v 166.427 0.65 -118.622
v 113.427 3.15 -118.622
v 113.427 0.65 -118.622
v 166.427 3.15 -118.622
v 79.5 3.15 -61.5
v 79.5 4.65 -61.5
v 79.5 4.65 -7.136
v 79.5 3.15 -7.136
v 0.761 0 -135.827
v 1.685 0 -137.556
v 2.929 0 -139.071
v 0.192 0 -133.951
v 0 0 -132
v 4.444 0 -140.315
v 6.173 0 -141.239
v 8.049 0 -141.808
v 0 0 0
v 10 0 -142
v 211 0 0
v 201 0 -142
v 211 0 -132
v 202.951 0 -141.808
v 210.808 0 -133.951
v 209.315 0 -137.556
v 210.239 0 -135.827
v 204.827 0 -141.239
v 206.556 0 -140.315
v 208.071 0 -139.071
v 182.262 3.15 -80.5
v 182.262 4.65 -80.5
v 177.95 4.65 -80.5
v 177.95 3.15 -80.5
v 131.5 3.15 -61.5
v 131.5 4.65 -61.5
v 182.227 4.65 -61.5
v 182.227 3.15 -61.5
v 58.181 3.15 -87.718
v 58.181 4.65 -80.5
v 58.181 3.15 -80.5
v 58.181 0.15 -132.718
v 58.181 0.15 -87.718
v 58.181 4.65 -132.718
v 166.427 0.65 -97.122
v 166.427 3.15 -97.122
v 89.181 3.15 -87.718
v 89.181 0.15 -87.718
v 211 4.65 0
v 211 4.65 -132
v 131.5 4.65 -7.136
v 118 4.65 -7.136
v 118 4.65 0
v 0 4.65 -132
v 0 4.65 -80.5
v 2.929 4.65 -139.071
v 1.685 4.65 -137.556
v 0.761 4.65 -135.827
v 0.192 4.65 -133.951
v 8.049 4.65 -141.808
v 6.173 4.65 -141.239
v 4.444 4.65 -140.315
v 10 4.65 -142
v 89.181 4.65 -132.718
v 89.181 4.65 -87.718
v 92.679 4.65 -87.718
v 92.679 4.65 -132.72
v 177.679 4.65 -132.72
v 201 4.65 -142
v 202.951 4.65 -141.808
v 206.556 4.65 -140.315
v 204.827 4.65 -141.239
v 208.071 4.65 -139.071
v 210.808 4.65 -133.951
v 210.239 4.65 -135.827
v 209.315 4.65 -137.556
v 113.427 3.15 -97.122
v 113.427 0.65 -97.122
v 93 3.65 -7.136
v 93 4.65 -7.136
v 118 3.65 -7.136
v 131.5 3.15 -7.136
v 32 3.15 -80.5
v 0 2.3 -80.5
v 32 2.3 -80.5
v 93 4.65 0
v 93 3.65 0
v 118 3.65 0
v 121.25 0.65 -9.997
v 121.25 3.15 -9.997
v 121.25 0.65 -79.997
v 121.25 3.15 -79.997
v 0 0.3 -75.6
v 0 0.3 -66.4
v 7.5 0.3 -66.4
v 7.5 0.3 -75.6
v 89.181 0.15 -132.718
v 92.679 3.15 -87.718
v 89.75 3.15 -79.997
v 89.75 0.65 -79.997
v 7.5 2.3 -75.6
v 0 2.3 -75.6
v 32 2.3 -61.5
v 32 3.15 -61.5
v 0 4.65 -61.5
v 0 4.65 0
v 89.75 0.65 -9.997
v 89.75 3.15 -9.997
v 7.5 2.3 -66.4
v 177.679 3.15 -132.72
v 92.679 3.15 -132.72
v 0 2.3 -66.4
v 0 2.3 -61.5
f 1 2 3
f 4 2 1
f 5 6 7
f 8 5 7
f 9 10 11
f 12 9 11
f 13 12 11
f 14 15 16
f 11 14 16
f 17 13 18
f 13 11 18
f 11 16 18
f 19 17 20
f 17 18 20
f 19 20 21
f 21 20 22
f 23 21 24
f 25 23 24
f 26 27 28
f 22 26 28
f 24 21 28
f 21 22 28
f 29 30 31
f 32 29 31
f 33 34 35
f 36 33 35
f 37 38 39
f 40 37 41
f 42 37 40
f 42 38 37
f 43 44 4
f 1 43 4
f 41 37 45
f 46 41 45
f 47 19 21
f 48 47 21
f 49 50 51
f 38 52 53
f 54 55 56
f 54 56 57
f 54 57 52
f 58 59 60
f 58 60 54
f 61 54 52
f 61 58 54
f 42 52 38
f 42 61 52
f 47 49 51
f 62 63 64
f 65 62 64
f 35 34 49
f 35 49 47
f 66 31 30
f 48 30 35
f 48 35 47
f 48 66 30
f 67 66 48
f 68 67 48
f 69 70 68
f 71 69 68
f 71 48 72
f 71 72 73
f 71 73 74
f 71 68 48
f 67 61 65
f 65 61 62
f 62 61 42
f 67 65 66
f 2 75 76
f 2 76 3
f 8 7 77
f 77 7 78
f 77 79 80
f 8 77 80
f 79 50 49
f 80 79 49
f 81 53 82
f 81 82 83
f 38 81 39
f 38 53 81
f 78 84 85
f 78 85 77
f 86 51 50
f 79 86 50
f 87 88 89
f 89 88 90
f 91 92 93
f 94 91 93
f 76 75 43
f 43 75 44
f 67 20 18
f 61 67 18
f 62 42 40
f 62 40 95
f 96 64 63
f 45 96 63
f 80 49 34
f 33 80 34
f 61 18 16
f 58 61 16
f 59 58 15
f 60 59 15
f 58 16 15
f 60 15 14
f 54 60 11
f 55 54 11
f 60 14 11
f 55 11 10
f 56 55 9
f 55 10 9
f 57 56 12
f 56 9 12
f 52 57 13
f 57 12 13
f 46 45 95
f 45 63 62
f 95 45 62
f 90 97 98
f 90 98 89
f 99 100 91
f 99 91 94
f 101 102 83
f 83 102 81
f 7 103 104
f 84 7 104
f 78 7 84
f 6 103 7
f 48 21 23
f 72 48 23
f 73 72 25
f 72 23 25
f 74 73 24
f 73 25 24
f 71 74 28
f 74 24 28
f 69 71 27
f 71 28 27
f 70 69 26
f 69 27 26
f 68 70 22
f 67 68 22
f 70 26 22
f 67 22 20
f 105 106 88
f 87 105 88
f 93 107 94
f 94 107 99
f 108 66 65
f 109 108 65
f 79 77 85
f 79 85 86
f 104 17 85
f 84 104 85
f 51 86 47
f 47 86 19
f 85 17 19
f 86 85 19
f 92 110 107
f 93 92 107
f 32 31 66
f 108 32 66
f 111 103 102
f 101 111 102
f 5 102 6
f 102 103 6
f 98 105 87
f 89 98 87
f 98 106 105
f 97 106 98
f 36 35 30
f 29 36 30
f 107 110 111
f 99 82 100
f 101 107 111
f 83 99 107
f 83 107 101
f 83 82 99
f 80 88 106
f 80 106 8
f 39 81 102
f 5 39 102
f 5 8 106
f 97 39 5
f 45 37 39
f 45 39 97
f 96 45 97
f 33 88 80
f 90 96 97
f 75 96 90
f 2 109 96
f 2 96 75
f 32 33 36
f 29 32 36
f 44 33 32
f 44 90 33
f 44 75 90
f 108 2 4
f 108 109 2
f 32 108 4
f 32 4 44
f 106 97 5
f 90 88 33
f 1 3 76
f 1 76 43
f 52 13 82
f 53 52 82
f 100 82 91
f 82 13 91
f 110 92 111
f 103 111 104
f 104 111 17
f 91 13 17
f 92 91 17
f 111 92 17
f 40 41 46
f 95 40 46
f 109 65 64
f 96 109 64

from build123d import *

# Parameters (mm, degrees)
BOSS_EXTRUDE1_DEPTH = 4.65
SKETCH2_W           = 32
SKETCH2_H           = 19
CUT_EXTRUDE1_DEPTH  = 2.35
SKETCH3_W           = 7.5
SKETCH3_H           = 9.2
CUT_EXTRUDE2_DEPTH  = 2
SKETCH4_W           = 31
SKETCH4_H           = 45
CUT_EXTRUDE3_DEPTH  = 4.5
SKETCH5_W           = 53
SKETCH5_H           = 21.5
CUT_EXTRUDE4_DEPTH  = 4
CUT_EXTRUDE5_DEPTH  = 1.5
SKETCH7_W           = 25
SKETCH7_H           = 13.967841501
CUT_EXTRUDE6_DEPTH  = 1
SKETCH9_W           = 31.5
SKETCH9_H           = 70
CUT_EXTRUDE8_DEPTH  = 4


with BuildPart() as part:
    # Sketch1 → Boss-Extrude1 (new body)
    with BuildSketch(Plane(origin=(0, 0, 0), x_dir=(1, 0, 0), z_dir=(0, 1, 0))):
        with BuildLine():
            Line((0, 0), (211, 0))
            Line((211, 0), (211, 132))
            ThreePointArc((211, 132), (208.071067812, 139.071067812), (201, 142))
            Line((201, 142), (10, 142))
            ThreePointArc((10, 142), (2.928932188, 139.071067812), (0, 132))
            Line((0, 132), (0, 0))
        make_face()
    extrude(amount=BOSS_EXTRUDE1_DEPTH)

    # Sketch2 → Cut-Extrude1 (cut)
    with BuildSketch(Plane(origin=(0, 4.65, 0), x_dir=(1, 0, 0), z_dir=(0, 1, 0))):
        with Locations((16, 71)):
            Rectangle(SKETCH2_W, SKETCH2_H)
    extrude(amount=-CUT_EXTRUDE1_DEPTH, mode=Mode.SUBTRACT)

    # Sketch3 → Cut-Extrude2 (cut)
    with BuildSketch(Plane(origin=(0, 2.3, 0), x_dir=(1, 0, 0), z_dir=(0, 1, 0))):
        with Locations((3.75, 71)):
            Rectangle(SKETCH3_W, SKETCH3_H)
    extrude(amount=-CUT_EXTRUDE2_DEPTH, mode=Mode.SUBTRACT)

    # Sketch4 → Cut-Extrude3 (cut)
    with BuildSketch(Plane(origin=(0, 4.65, 0), x_dir=(1, 0, 0), z_dir=(0, 1, 0))):
        with Locations((73.681319495, 110.218338853)):
            Rectangle(SKETCH4_W, SKETCH4_H)
    extrude(amount=-CUT_EXTRUDE3_DEPTH, mode=Mode.SUBTRACT)

    # Sketch5 → Cut-Extrude4 (cut)
    with BuildSketch(Plane(origin=(0, 4.65, 0), x_dir=(1, 0, 0), z_dir=(0, 1, 0))):
        with Locations((139.927272952, 107.871903627)):
            Rectangle(SKETCH5_W, SKETCH5_H)
    extrude(amount=-CUT_EXTRUDE4_DEPTH, mode=Mode.SUBTRACT)

    # Sketch6 → Cut-Extrude5 (cut)
    with BuildSketch(Plane(origin=(0, 4.65, 0), x_dir=(1, 0, 0), z_dir=(0, 1, 0))):
        Polygon((32, 61.5), (79.5, 61.5), (79.5, 7.136151196), (131.5, 7.136151196), (131.5, 61.5), (182.227109874, 61.5), (182.261915258, 80.5), (177.949598934, 80.5), (177.678969488, 132.72), (92.678969488, 132.72), (92.678969488, 87.718338853), (89.181319495, 87.718338853), (89.181319495, 132.718338853), (58.181319495, 132.718338853), (58.181319495, 80.5), (32, 80.5), align=None)
    extrude(amount=-CUT_EXTRUDE5_DEPTH, mode=Mode.SUBTRACT)

    # Sketch7 → Cut-Extrude6 (cut)
    with BuildSketch(Plane(origin=(0, 4.65, 0), x_dir=(1, 0, 0), z_dir=(0, 1, 0))):
        with Locations((105.5, 6.983920751)):
            Rectangle(SKETCH7_W, SKETCH7_H)
    extrude(amount=-CUT_EXTRUDE6_DEPTH, mode=Mode.SUBTRACT)

    # Sketch9 → Cut-Extrude8 (cut)
    with BuildSketch(Plane(origin=(0, 4.65, 0), x_dir=(1, 0, 0), z_dir=(0, 1, 0))):
        with Locations((105.5, 44.997499802)):
            Rectangle(SKETCH9_W, SKETCH9_H)
    extrude(amount=-CUT_EXTRUDE8_DEPTH, mode=Mode.SUBTRACT)


solid = part.part
